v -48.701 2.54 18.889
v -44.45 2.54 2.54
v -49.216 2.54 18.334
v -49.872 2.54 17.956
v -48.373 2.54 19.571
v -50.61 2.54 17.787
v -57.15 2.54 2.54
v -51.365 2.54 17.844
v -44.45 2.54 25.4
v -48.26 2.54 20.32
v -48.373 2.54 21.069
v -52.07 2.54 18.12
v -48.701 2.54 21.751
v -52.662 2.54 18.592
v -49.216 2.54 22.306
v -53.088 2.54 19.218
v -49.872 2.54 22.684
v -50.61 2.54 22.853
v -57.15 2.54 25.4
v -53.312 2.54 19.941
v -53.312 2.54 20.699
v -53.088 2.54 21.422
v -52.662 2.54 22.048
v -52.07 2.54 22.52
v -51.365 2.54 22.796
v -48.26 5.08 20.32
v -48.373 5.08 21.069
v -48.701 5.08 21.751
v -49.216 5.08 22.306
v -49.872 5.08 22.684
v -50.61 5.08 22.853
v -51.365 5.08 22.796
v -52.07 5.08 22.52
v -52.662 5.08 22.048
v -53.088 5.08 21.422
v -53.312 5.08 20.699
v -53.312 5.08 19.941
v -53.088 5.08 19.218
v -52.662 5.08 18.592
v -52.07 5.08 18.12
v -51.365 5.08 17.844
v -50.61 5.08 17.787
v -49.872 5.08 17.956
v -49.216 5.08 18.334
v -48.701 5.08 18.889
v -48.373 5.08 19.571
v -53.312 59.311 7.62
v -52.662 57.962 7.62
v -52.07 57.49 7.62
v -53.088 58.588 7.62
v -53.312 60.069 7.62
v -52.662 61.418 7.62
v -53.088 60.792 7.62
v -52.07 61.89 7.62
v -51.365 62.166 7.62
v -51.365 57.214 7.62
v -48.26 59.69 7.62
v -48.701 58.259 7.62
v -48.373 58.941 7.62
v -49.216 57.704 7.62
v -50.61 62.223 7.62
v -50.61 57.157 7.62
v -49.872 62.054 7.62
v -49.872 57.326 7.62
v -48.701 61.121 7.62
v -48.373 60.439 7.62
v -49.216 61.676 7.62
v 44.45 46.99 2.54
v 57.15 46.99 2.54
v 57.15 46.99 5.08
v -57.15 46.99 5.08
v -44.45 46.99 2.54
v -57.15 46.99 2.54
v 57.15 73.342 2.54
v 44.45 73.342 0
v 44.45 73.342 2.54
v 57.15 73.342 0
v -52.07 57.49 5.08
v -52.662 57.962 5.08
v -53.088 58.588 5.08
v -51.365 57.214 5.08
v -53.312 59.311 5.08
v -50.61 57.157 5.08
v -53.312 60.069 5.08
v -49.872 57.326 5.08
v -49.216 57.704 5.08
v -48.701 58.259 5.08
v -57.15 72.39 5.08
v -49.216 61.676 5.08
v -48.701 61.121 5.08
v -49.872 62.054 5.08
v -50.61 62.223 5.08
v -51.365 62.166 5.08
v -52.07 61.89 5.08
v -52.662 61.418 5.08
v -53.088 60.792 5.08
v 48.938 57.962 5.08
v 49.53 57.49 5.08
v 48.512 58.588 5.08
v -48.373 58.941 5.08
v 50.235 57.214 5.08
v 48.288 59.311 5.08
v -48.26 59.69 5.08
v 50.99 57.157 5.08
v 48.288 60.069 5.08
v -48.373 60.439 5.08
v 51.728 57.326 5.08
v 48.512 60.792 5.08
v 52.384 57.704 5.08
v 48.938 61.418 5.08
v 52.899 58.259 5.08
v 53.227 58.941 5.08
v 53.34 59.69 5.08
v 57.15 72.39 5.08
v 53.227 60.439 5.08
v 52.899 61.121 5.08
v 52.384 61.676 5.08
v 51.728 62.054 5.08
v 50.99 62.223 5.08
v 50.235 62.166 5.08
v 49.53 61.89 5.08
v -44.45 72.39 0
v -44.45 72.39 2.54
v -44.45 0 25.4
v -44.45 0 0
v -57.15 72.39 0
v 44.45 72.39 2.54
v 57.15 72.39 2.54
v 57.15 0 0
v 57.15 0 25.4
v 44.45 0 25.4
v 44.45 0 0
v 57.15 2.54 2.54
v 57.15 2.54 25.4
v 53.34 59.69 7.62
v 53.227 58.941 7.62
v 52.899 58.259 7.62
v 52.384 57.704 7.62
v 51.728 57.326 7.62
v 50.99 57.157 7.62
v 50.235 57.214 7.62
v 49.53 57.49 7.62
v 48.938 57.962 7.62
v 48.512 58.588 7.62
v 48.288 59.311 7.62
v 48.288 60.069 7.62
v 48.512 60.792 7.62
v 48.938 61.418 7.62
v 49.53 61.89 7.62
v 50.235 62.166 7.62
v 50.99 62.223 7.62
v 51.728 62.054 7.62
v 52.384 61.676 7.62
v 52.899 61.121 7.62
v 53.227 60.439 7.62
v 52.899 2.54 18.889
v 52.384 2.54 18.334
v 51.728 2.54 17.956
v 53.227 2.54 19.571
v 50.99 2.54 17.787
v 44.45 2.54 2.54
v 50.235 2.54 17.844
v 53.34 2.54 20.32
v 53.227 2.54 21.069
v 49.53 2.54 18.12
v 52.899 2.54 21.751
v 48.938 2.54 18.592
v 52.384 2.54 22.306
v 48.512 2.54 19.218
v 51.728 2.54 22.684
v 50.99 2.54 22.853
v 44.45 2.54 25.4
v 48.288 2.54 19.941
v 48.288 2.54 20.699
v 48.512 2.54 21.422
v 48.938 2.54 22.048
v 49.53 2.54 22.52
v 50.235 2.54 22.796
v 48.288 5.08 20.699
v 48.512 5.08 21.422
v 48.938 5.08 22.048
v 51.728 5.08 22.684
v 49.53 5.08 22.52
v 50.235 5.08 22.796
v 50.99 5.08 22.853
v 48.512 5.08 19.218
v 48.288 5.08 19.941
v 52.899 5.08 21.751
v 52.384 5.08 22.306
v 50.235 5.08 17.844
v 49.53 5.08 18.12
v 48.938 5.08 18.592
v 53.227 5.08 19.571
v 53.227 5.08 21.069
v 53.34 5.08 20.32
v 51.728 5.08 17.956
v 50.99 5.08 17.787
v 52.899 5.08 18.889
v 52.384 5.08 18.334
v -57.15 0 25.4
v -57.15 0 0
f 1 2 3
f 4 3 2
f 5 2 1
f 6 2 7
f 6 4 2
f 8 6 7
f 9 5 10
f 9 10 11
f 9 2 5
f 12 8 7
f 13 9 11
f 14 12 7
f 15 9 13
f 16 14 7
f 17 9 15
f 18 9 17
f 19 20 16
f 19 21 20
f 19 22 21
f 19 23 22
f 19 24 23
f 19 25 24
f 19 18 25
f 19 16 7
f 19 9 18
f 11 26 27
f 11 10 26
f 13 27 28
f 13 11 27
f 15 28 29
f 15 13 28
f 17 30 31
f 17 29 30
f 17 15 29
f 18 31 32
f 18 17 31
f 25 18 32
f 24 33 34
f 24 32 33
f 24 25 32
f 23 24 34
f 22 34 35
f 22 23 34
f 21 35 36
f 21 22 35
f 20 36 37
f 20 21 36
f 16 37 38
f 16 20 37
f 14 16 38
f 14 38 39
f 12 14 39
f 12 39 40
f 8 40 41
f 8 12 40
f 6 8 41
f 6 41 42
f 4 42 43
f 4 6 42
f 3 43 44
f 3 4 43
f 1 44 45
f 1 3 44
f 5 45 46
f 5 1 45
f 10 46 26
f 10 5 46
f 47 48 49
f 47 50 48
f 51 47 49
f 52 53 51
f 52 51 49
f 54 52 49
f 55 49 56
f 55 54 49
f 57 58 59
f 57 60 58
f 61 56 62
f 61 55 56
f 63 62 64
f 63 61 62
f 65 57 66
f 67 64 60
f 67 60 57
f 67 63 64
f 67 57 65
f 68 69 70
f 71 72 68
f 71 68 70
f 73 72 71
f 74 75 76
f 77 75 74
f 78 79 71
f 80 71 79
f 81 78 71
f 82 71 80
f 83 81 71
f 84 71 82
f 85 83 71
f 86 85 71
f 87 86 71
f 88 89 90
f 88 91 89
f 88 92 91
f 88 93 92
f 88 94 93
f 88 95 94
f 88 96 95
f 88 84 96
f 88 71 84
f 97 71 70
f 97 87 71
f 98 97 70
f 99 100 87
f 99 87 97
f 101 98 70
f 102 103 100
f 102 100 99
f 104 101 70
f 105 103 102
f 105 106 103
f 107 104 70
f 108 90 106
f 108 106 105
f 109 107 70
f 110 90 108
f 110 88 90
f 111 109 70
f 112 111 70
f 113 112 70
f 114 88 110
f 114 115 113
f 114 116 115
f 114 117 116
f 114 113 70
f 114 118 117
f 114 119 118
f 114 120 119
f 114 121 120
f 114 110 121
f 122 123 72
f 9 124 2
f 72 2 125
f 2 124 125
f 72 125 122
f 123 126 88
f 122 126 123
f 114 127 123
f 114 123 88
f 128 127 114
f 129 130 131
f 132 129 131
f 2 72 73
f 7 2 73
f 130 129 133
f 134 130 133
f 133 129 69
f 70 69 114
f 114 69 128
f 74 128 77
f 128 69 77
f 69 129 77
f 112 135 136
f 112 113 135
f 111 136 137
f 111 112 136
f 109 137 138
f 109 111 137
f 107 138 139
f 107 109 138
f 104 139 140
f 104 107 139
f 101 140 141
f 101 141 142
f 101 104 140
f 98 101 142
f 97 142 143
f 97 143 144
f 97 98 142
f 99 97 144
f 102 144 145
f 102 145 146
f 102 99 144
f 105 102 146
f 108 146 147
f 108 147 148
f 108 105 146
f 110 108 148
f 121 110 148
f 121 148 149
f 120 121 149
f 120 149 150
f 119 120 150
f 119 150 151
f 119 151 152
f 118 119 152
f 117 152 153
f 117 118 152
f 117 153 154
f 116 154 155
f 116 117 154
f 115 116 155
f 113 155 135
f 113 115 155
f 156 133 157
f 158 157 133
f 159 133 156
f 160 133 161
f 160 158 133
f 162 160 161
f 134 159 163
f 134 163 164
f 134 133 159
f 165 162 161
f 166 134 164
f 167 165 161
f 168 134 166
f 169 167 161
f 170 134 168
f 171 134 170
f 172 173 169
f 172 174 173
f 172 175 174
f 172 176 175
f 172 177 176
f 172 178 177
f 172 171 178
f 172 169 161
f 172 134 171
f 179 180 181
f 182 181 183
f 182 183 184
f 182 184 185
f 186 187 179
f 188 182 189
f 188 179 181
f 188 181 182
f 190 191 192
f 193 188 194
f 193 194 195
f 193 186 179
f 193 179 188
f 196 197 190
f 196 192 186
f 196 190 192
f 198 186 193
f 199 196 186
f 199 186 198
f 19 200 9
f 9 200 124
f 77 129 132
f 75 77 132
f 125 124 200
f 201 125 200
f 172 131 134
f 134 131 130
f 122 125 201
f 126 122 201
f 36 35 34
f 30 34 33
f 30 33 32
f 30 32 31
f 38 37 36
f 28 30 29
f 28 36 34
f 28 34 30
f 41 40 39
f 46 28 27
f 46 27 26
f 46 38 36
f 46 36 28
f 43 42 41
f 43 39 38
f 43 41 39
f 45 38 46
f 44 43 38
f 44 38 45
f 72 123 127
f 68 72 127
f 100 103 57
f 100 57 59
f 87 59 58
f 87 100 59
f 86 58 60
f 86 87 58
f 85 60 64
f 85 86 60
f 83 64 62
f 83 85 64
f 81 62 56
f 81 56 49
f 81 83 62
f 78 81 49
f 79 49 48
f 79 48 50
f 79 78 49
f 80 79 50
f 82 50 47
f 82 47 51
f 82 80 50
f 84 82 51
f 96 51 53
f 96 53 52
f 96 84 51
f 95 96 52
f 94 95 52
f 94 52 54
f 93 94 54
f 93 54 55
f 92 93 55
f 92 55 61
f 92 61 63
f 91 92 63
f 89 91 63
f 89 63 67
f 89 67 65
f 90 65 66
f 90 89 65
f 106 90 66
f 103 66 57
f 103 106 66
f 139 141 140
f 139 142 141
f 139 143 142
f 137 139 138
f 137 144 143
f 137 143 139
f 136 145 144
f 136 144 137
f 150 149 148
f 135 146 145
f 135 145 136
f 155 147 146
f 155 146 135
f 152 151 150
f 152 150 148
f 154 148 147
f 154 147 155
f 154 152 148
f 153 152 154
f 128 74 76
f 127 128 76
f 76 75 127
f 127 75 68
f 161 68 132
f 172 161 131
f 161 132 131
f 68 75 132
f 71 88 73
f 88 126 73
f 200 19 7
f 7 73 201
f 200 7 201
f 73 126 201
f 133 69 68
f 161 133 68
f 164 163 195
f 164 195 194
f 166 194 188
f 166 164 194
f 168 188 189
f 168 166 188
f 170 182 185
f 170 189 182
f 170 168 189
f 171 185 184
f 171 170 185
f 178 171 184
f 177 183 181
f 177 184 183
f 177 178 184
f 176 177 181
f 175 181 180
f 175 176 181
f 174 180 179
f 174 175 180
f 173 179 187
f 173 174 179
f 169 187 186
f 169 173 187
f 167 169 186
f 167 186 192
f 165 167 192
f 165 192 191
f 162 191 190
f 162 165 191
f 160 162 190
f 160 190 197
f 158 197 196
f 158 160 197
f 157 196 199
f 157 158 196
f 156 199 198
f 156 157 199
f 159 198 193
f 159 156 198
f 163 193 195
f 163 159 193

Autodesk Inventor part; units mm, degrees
ref_plane "YZ Plane" through (0, 0, 0) normal (1, 0, 0) x (0, 1, 0)
ref_plane "XZ Plane" through (0, 0, 0) normal (0, 1, 0) x (-1, 0, 0)
ref_plane "XY Plane" through (0, 0, 0) normal (0, 0, 1) x (1, 0, 0)
sketch "Sketch1" plane through (0, 0, 0) normal (0, 1, 0) x (-1, 0, 0)
  line L0 (57.15, 25.4) -> (44.45, 25.4)
  line L1 (44.45, 25.4) -> (44.45, 0)
  line L2 (44.45, 0) -> (57.15, 0)
  line L3 (57.15, 0) -> (57.15, 25.4)
  line L4 (-44.45, 25.4) -> (-57.15, 25.4)
  line L5 (-57.15, 25.4) -> (-57.15, 0)
  line L6 (-57.15, 0) -> (-44.45, 0)
  line L7 (-44.45, 0) -> (-44.45, 25.4)
  line L8 (44.45, 25.4) -> (-44.45, 25.4) construction
  point P0 (0, 0)
  dimension "d0" = 12.7
  dimension "d1" = 25.4
  dimension "d2" = 114.3
  dimension "d3" = 57.15
extrude "Extrusion1" add sketch "Sketch1" along normal blind 2.54
sketch "Sketch2" plane through (57.15, 0, 0) normal (0, 0, -1) x (-1, 0, 0)
  line L0 (0, 0.9525) -> (12.7, 0.9525)
  line L1 (12.7, 0.9525) -> (12.7, 73.3425)
  line L2 (12.7, 73.3425) -> (0, 73.3425)
  line L3 (0, 73.3425) -> (0, 0.9525)
  line L4 (101.6, 0) -> (114.3, 0)
  line L5 (114.3, 0) -> (114.3, 72.39)
  line L6 (114.3, 72.39) -> (101.6, 72.39)
  line L7 (101.6, 72.39) -> (101.6, 0)
  line L8 (12.7, 0) -> (12.7, 2.54) projected
  point P0 (57.15, 0)
  dimension "d6" = 12.7
  dimension "d7" = 12.7
  dimension "d8" = 12.7
  dimension "d9" = 72.39
extrude "Extrusion2" add sketch "Sketch2" against normal blind 2.54
sketch "Sketch3" plane through (57.15, 0, 2.54) normal (0, 0, 1) x (1, 0, 0)
  line L0 (-114.3, 72.39) -> (-114.3, 2.54) projected
  line L1 (0, 2.54) -> (0, 73.3425) projected
  line L2 (-114.3, 72.39) -> (0, 72.39)
  line L3 (0, 72.39) -> (0, 46.99)
  line L4 (0, 46.99) -> (-114.3, 46.99)
  line L5 (-114.3, 46.99) -> (-114.3, 72.39)
  point P0 (-57.15, 0)
  point P1 (0, 72.39)
  point P2 (0, 3.81)
  dimension "d12" = 25.4
extrude "Extrusion3" add sketch "Sketch3" along normal blind 2.54
sketch "Sketch4" plane through (57.15, 0, 5.08) normal (0, 0, 1) x (1, 0, 0)
  circle A0 centre (-107.95, 59.69) radius 2.54
  circle A1 centre (-6.35, 59.69) radius 2.54
  line L0 (-114.3, 72.39) -> (-114.3, 46.99) projected
  line L1 (-114.3, 59.69) -> (-107.95, 59.69)
  line L2 (-107.95, 59.69) -> (-6.35, 59.69)
  line L3 (-6.35, 59.69) -> (0, 59.69)
  line L4 (0, 46.99) -> (0, 72.39) projected
  point P0 (-57.15, 0)
  dimension "d15" = 5.08
  dimension "d16" = 6.35
extrude "Extrusion4" add sketch "Sketch4" along normal blind 2.54
sketch "Sketch5" plane through (0, 2.54, 0) normal (0, 1, 0) x (1, 0, 0)
  circle A0 centre (-50.8, -20.32) radius 2.54
  circle A1 centre (50.8, -20.32) radius 2.54
  line L0 (-57.15, -25.4) -> (-44.45, -25.4) projected
  line L1 (-50.8, -25.4) -> (-50.8, 0) construction
  line L2 (44.45, -25.4) -> (57.15, -25.4) projected
  line L3 (50.8, -25.4) -> (50.8, 0) construction
  point P0 (0, 0)
  dimension "d19" = 5.08
  dimension "d20" = 5.08
  dimension "d21" = 5.08
extrude "Extrusion5" add sketch "Sketch5" along normal blind 2.54
equation "\"d3\" = 0.5 * d2"
equation "\"d21\" = d20"
properties part number "Frame"
